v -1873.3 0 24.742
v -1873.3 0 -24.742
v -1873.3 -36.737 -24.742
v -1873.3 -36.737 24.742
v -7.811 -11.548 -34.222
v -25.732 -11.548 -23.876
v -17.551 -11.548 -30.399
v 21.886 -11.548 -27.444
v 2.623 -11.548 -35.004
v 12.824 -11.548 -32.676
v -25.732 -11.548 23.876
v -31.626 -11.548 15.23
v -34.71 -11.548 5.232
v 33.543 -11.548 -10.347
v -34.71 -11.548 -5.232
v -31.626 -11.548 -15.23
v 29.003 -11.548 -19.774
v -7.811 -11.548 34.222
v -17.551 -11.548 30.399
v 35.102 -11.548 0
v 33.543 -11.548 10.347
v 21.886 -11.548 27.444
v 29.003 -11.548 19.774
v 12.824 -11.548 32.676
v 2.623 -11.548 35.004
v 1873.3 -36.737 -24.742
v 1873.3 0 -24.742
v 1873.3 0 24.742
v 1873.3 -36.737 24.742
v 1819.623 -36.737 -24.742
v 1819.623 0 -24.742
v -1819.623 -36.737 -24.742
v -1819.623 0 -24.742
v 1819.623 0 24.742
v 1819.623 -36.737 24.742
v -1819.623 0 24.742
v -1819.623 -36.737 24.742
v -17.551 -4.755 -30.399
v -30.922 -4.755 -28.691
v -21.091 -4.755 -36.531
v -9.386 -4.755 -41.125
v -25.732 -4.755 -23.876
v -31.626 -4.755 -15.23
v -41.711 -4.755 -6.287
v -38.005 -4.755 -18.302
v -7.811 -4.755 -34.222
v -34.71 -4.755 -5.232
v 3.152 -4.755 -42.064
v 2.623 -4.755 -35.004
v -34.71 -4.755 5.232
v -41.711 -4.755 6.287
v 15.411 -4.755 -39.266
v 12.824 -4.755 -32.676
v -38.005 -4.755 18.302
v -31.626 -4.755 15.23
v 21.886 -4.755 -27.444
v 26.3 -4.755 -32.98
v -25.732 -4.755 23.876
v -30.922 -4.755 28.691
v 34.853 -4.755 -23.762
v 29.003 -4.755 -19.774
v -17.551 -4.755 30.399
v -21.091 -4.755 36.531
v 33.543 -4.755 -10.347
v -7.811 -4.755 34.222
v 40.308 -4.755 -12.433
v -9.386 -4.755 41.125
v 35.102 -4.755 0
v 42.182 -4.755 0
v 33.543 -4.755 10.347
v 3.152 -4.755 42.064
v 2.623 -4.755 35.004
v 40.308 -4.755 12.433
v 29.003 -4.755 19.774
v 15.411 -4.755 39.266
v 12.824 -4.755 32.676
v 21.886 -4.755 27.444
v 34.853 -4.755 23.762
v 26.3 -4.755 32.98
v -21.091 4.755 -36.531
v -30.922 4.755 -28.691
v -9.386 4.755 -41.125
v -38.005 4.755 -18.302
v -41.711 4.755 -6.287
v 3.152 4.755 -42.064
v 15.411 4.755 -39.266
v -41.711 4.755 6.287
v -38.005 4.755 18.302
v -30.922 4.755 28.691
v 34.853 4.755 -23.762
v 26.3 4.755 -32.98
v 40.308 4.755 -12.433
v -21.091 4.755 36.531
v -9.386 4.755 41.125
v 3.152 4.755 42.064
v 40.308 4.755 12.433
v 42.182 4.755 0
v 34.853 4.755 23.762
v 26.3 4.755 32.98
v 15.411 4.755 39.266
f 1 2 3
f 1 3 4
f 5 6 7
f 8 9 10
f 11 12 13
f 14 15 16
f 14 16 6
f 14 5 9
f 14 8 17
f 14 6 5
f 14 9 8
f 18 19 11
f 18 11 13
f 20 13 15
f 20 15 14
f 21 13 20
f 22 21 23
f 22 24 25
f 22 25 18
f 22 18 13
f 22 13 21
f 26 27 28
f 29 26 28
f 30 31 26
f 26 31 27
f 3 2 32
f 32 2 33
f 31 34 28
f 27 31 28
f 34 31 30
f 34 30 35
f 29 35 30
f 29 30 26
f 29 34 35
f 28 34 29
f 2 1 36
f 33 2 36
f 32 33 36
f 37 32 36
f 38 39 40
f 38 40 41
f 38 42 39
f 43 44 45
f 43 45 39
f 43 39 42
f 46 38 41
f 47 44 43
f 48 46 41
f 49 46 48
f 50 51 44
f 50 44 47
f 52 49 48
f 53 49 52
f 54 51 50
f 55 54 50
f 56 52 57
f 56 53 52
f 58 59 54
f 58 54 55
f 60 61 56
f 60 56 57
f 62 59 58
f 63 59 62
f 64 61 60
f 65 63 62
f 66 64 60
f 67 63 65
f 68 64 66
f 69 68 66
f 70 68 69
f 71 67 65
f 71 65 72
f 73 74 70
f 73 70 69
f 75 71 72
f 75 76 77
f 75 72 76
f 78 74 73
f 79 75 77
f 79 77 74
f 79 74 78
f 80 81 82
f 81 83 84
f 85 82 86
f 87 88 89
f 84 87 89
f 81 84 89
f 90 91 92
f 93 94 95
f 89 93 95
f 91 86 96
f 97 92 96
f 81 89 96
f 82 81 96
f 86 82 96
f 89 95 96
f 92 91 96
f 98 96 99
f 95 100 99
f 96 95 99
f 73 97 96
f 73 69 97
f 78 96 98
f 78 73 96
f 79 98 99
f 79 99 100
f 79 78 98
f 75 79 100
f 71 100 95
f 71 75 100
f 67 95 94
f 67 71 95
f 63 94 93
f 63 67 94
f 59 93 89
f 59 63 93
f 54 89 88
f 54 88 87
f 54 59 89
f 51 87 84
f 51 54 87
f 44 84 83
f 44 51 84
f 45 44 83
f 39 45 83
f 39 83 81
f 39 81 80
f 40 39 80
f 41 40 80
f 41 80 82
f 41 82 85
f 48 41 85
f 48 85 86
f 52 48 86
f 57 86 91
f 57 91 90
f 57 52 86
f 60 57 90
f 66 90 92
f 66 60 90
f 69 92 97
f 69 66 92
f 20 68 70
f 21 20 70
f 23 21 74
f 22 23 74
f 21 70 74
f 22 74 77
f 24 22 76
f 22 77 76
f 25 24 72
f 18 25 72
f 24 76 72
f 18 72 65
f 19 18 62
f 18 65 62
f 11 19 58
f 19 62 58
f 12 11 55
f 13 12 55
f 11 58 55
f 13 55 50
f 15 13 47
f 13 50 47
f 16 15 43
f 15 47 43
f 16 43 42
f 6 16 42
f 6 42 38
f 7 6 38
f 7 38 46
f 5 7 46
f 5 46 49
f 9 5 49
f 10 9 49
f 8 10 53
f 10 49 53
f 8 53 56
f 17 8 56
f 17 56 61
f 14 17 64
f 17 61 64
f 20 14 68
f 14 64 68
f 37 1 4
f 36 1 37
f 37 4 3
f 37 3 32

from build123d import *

# Parameters (mm, degrees)
F0_R     = 42.182367
F1_DEPTH = 4.75482
F2_R     = 35.102232
F3_DEPTH = 6.79291
F4_W     = 53.677312
F4_H     = 49.48378
F5_DEPTH = 36.7371


with BuildPart() as f1:
    # F0 (on Front) → F1 (new body, symmetric)
    with BuildSketch(Plane.XZ):
        Circle(F0_R)
    extrude(amount=F1_DEPTH, both=True)

    # F2 (on face) → F3 (join)
    with BuildSketch(Plane.XZ.offset(4.75482)):
        Circle(F2_R)
    extrude(amount=F3_DEPTH)


with BuildPart() as f5:
    # F4 (on Front) → F5 (new body)
    with BuildSketch(Plane.XZ):
        with Locations((1846.461631, 0)):
            Rectangle(F4_W, F4_H)
        with Locations((-1846.461631, 0)):
            Rectangle(F4_W, F4_H)
    extrude(amount=F5_DEPTH)


solid = Compound([f1.part, f5.part])
